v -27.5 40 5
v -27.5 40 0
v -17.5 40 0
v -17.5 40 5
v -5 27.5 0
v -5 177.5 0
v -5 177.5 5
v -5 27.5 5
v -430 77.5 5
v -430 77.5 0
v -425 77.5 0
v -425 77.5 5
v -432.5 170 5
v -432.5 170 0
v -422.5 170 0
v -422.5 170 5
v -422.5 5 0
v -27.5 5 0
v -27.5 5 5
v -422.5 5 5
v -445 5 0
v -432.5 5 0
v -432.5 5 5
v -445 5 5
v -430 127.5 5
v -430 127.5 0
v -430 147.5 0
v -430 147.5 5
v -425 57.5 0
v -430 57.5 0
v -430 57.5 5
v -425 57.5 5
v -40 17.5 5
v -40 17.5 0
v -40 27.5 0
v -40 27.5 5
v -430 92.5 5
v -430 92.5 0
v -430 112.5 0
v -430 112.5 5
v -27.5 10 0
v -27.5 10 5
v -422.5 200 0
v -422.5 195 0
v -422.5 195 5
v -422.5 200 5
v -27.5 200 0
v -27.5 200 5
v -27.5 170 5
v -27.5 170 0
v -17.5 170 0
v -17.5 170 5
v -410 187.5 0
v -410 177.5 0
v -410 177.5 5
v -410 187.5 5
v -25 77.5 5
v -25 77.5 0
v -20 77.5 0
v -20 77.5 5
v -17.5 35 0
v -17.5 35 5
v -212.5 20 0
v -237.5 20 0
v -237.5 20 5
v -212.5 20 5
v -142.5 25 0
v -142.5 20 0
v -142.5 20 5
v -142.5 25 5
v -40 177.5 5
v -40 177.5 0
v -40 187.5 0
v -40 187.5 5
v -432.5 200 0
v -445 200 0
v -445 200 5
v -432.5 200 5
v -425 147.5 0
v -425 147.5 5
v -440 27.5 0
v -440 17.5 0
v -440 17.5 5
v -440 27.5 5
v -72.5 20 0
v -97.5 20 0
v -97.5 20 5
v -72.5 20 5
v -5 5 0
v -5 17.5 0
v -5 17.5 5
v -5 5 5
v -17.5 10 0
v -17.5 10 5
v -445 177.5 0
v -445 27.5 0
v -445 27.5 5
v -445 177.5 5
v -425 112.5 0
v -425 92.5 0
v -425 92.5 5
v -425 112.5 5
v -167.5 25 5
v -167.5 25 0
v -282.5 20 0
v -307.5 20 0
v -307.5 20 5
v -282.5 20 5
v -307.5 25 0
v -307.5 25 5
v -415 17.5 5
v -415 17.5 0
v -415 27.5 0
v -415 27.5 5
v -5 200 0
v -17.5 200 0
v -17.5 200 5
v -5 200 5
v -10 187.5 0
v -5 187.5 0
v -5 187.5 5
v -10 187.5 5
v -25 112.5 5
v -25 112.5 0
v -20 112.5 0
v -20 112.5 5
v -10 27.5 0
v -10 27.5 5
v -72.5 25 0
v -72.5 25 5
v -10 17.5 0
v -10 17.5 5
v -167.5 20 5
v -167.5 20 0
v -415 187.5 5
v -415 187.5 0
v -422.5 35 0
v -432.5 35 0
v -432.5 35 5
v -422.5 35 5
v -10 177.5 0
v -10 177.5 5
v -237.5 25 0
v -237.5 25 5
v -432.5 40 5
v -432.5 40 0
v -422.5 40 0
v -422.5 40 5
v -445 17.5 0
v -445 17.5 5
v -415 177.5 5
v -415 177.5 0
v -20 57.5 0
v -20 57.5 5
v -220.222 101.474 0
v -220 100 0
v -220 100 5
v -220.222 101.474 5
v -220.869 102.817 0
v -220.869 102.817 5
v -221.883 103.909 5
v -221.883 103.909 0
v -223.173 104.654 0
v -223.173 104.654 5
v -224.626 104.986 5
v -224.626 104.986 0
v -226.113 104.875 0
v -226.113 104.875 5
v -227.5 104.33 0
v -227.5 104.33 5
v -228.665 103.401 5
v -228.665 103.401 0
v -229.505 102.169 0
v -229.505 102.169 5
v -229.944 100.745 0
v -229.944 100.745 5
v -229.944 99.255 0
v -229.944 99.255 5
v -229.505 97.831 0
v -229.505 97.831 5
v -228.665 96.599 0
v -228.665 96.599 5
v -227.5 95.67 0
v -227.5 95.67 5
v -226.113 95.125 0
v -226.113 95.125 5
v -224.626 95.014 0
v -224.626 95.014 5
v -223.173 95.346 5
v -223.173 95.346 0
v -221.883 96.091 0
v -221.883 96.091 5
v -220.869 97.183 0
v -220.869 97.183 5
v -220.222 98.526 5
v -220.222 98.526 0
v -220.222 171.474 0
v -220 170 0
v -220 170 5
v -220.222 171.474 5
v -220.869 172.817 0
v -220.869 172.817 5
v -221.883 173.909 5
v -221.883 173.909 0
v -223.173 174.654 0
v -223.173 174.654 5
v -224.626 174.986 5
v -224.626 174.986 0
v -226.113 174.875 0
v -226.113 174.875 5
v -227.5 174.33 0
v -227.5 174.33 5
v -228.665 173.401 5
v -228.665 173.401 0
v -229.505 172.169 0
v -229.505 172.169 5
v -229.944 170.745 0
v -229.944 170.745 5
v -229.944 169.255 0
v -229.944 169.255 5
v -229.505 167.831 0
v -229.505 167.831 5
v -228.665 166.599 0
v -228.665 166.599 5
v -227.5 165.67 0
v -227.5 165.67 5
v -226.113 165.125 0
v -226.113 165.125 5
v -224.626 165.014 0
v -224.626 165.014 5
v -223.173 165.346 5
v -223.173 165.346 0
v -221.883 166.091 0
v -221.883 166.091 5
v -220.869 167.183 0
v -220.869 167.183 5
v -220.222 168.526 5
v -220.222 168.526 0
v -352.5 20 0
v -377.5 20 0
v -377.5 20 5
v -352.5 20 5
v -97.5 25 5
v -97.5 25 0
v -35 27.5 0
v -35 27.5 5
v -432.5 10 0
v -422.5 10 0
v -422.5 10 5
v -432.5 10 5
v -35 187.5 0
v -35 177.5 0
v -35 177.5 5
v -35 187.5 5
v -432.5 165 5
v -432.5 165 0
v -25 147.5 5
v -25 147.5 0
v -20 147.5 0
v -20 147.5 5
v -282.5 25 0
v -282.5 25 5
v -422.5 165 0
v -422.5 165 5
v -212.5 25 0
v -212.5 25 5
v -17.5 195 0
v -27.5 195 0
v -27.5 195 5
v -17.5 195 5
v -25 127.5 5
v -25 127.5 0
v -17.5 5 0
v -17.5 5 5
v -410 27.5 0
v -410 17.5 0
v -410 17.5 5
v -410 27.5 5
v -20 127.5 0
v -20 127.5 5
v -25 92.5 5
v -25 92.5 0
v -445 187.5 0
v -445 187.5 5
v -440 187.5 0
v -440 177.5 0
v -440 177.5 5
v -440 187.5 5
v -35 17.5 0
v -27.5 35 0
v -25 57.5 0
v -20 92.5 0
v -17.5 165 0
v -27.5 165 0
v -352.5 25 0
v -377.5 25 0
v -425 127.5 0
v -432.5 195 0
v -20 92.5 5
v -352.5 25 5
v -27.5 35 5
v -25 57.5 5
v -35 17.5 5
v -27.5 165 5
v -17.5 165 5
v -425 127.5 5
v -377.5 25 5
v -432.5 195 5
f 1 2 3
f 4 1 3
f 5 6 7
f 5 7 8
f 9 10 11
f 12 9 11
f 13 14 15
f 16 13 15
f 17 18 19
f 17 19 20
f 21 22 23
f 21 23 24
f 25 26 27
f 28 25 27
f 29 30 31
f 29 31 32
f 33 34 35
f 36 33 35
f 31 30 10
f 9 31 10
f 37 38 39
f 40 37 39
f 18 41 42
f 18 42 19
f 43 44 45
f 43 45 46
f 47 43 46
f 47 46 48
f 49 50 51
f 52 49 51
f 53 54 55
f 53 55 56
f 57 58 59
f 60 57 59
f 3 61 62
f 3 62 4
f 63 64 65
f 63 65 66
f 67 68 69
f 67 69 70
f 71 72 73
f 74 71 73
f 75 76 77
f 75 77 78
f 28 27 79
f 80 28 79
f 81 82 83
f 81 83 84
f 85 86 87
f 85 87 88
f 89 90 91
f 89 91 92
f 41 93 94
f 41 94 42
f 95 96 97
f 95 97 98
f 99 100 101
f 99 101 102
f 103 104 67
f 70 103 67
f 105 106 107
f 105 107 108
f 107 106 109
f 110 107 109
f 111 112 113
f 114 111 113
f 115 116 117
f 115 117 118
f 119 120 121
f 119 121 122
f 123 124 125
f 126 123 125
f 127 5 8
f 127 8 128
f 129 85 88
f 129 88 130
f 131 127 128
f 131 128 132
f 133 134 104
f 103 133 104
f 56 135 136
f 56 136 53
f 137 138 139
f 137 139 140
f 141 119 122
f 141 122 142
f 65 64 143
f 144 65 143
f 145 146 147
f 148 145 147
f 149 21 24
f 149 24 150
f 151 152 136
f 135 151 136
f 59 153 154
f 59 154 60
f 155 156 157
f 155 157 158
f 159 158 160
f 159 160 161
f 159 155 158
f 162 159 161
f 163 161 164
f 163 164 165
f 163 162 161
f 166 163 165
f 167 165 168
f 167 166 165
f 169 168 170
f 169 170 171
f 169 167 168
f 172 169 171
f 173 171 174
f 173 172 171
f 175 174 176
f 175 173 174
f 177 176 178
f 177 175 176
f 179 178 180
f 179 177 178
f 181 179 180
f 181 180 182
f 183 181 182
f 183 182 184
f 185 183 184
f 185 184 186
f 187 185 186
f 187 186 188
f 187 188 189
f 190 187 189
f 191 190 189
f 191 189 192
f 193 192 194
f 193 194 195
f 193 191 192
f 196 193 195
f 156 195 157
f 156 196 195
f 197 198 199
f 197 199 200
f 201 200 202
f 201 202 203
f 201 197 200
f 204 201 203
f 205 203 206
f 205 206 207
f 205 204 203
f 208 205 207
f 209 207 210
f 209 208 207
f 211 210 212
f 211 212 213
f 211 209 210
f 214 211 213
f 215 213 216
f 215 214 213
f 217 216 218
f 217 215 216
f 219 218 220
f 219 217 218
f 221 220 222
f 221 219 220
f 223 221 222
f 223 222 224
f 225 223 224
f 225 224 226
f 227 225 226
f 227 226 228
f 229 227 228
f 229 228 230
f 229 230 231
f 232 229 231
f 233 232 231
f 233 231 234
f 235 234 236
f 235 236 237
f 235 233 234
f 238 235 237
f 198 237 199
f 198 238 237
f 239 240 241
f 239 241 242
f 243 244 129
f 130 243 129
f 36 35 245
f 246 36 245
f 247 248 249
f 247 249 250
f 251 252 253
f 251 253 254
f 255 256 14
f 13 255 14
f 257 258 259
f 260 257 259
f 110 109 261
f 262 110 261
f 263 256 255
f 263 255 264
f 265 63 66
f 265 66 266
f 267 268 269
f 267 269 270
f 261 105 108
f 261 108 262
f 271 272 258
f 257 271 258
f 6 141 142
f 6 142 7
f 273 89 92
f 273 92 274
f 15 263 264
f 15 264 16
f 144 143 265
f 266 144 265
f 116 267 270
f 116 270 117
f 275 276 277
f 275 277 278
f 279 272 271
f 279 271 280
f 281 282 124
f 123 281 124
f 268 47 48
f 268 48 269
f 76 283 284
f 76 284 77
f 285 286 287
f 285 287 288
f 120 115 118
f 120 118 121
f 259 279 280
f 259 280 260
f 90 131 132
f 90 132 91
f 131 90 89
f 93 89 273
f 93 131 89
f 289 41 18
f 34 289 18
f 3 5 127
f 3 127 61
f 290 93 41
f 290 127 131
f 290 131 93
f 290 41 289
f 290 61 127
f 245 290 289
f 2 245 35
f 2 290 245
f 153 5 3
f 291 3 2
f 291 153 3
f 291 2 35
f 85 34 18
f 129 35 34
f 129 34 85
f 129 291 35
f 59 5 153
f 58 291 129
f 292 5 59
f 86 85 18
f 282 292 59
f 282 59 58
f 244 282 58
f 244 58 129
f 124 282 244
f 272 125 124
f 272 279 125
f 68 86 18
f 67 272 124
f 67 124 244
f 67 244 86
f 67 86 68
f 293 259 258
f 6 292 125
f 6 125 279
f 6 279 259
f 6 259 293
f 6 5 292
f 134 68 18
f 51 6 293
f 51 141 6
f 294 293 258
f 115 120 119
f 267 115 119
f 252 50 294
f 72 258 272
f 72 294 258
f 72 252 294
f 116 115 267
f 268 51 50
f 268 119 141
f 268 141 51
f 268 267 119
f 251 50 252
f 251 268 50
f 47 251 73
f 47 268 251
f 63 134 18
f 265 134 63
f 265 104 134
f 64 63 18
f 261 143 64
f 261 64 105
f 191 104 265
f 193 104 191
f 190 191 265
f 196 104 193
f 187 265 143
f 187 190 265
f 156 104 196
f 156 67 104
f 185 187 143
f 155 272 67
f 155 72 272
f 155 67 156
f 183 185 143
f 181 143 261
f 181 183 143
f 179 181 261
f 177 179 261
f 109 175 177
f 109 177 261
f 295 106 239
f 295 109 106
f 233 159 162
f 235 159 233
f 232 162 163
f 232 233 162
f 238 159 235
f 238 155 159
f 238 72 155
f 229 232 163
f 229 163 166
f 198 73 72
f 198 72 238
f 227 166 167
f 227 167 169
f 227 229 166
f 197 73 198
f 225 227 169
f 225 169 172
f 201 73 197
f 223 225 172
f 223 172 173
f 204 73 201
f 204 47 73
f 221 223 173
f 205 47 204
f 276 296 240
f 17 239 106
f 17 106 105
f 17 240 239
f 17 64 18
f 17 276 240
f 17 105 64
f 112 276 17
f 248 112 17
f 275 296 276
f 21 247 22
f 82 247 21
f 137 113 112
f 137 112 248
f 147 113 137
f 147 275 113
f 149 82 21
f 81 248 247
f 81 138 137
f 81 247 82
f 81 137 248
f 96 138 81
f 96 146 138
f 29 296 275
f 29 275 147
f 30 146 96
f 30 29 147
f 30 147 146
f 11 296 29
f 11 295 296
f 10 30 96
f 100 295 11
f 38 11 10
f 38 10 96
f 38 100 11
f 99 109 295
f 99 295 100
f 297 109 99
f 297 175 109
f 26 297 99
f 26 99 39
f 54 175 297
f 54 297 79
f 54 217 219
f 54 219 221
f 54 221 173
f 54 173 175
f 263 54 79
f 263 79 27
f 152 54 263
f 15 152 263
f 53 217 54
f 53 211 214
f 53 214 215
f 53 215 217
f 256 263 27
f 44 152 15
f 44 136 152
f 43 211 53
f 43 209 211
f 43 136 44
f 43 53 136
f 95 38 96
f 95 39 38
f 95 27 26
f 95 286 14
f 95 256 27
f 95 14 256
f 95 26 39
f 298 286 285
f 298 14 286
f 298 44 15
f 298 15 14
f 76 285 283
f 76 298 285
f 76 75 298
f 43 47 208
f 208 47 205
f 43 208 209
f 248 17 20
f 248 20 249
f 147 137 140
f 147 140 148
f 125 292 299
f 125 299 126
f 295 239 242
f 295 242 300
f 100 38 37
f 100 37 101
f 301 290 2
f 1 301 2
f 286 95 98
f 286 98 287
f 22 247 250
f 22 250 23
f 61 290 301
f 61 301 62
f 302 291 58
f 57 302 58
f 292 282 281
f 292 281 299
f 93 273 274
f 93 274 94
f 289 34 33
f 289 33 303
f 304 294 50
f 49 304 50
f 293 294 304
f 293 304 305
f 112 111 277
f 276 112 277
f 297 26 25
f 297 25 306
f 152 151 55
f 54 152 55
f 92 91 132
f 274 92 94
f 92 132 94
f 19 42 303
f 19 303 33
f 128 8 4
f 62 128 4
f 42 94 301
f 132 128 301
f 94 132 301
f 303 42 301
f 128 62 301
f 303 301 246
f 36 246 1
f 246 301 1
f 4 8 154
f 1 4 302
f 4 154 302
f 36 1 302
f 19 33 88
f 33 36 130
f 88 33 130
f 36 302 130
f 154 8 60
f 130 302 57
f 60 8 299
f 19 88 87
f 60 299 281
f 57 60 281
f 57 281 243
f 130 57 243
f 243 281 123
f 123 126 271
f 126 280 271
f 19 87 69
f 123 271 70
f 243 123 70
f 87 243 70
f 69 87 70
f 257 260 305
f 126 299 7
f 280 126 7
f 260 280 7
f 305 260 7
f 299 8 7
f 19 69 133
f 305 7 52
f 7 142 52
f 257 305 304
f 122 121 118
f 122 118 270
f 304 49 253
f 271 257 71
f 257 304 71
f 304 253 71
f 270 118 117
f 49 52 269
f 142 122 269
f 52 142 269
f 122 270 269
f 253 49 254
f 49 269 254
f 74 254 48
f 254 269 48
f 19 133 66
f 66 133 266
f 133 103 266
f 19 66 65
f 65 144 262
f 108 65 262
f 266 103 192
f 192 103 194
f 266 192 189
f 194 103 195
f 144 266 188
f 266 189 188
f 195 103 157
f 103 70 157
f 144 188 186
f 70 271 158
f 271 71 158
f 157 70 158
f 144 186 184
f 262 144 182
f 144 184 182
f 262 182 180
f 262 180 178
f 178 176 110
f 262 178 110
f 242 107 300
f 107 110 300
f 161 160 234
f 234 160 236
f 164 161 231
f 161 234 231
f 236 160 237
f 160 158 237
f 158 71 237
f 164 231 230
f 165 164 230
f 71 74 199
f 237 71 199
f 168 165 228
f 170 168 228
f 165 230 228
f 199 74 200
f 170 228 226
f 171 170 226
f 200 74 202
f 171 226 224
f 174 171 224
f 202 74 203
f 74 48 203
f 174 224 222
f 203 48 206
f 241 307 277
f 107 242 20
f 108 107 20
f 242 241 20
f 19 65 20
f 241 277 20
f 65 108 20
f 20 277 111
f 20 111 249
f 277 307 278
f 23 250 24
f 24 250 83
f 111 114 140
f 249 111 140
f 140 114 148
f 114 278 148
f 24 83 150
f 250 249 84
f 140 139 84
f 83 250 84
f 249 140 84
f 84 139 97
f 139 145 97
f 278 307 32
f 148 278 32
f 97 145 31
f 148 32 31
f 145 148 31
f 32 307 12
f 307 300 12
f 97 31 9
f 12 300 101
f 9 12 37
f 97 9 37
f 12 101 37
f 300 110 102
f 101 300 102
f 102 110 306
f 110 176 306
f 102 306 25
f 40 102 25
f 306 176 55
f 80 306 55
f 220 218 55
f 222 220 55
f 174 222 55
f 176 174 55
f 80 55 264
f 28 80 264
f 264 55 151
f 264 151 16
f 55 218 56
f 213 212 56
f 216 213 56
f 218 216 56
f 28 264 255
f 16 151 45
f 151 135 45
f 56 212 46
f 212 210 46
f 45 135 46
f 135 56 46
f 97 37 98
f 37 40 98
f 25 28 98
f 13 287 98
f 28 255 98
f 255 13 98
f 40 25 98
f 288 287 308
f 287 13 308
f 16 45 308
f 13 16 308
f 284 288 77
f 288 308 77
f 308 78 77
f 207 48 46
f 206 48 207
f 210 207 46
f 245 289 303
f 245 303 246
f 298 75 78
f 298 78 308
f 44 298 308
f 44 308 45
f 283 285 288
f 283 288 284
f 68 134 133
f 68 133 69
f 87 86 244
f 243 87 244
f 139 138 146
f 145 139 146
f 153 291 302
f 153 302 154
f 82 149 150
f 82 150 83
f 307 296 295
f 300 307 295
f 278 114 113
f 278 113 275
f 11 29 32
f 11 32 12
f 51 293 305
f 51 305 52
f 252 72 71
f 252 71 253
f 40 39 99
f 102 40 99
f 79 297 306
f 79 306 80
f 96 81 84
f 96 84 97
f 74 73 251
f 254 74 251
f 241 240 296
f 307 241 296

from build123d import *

# Parameters (mm, degrees)
SKETCH1_R           = 5
SKETCH1_W           = 10
SKETCH1_H           = 5
SKETCH1_W_2         = 4.999728605
SKETCH1_H_2         = 10
SKETCH1_W_3         = 5
SKETCH1_H_3         = 20
SKETCH1_W_4         = 25
BOSS_EXTRUDE1_DEPTH = 5


with BuildPart() as part:
    # Sketch1 → Boss-Extrude1 (new body)
    with BuildSketch(Plane.XY):
        Polygon((-5, 5), (-17.5, 5), (-17.5, 10), (-27.5, 10), (-27.5, 5), (-422.5, 5), (-422.5, 10), (-432.5, 10), (-432.5, 5), (-445, 5), (-445, 17.5), (-440, 17.5), (-440, 27.5), (-445, 27.5), (-445, 177.5), (-440, 177.5), (-440, 187.5), (-445, 187.5), (-445, 200), (-432.5, 200), (-432.5, 195), (-422.5, 195), (-422.5, 200), (-27.5, 200), (-27.5, 195), (-17.5, 195), (-17.5, 200), (-5, 200), (-5, 187.5), (-10, 187.5), (-10, 177.5), (-5, 177.5), (-5, 27.5), (-10, 27.5), (-10, 17.5), (-5, 17.5), align=None)
        with Locations((-225, 170)):
            Circle(SKETCH1_R, mode=Mode.SUBTRACT)
        with Locations((-225, 100)):
            Circle(SKETCH1_R, mode=Mode.SUBTRACT)
        with Locations((-22.5, 37.5)):
            Rectangle(SKETCH1_W, SKETCH1_H, mode=Mode.SUBTRACT)
        with Locations((-37.500135697, 22.5)):
            Rectangle(SKETCH1_W_2, SKETCH1_H_2, mode=Mode.SUBTRACT)
        with Locations((-412.499864302, 22.5)):
            Rectangle(SKETCH1_W_2, SKETCH1_H_2, mode=Mode.SUBTRACT)
        with Locations((-427.5, 37.5)):
            Rectangle(SKETCH1_W, SKETCH1_H, mode=Mode.SUBTRACT)
        with Locations((-427.5, 167.5)):
            Rectangle(SKETCH1_W, SKETCH1_H, mode=Mode.SUBTRACT)
        with Locations((-412.499864302, 182.5)):
            Rectangle(SKETCH1_W_2, SKETCH1_H_2, mode=Mode.SUBTRACT)
        with Locations((-37.500135697, 182.5)):
            Rectangle(SKETCH1_W_2, SKETCH1_H_2, mode=Mode.SUBTRACT)
        with Locations((-22.5, 167.5)):
            Rectangle(SKETCH1_W, SKETCH1_H, mode=Mode.SUBTRACT)
        with Locations((-427.5, 67.5)):
            Rectangle(SKETCH1_W_3, SKETCH1_H_3, mode=Mode.SUBTRACT)
        with Locations((-427.5, 102.5)):
            Rectangle(SKETCH1_W_3, SKETCH1_H_3, mode=Mode.SUBTRACT)
        with Locations((-427.5, 137.5)):
            Rectangle(SKETCH1_W_3, SKETCH1_H_3, mode=Mode.SUBTRACT)
        with Locations((-22.5, 137.5)):
            Rectangle(SKETCH1_W_3, SKETCH1_H_3, mode=Mode.SUBTRACT)
        with Locations((-22.5, 102.5)):
            Rectangle(SKETCH1_W_3, SKETCH1_H_3, mode=Mode.SUBTRACT)
        with Locations((-22.5, 67.5)):
            Rectangle(SKETCH1_W_3, SKETCH1_H_3, mode=Mode.SUBTRACT)
        with Locations((-365, 22.5)):
            Rectangle(SKETCH1_W_4, SKETCH1_H, mode=Mode.SUBTRACT)
        with Locations((-295, 22.5)):
            Rectangle(SKETCH1_W_4, SKETCH1_H, mode=Mode.SUBTRACT)
        with Locations((-225, 22.5)):
            Rectangle(SKETCH1_W_4, SKETCH1_H, mode=Mode.SUBTRACT)
        with Locations((-155, 22.5)):
            Rectangle(SKETCH1_W_4, SKETCH1_H, mode=Mode.SUBTRACT)
        with Locations((-85, 22.5)):
            Rectangle(SKETCH1_W_4, SKETCH1_H, mode=Mode.SUBTRACT)
    extrude(amount=BOSS_EXTRUDE1_DEPTH)


solid = part.part
